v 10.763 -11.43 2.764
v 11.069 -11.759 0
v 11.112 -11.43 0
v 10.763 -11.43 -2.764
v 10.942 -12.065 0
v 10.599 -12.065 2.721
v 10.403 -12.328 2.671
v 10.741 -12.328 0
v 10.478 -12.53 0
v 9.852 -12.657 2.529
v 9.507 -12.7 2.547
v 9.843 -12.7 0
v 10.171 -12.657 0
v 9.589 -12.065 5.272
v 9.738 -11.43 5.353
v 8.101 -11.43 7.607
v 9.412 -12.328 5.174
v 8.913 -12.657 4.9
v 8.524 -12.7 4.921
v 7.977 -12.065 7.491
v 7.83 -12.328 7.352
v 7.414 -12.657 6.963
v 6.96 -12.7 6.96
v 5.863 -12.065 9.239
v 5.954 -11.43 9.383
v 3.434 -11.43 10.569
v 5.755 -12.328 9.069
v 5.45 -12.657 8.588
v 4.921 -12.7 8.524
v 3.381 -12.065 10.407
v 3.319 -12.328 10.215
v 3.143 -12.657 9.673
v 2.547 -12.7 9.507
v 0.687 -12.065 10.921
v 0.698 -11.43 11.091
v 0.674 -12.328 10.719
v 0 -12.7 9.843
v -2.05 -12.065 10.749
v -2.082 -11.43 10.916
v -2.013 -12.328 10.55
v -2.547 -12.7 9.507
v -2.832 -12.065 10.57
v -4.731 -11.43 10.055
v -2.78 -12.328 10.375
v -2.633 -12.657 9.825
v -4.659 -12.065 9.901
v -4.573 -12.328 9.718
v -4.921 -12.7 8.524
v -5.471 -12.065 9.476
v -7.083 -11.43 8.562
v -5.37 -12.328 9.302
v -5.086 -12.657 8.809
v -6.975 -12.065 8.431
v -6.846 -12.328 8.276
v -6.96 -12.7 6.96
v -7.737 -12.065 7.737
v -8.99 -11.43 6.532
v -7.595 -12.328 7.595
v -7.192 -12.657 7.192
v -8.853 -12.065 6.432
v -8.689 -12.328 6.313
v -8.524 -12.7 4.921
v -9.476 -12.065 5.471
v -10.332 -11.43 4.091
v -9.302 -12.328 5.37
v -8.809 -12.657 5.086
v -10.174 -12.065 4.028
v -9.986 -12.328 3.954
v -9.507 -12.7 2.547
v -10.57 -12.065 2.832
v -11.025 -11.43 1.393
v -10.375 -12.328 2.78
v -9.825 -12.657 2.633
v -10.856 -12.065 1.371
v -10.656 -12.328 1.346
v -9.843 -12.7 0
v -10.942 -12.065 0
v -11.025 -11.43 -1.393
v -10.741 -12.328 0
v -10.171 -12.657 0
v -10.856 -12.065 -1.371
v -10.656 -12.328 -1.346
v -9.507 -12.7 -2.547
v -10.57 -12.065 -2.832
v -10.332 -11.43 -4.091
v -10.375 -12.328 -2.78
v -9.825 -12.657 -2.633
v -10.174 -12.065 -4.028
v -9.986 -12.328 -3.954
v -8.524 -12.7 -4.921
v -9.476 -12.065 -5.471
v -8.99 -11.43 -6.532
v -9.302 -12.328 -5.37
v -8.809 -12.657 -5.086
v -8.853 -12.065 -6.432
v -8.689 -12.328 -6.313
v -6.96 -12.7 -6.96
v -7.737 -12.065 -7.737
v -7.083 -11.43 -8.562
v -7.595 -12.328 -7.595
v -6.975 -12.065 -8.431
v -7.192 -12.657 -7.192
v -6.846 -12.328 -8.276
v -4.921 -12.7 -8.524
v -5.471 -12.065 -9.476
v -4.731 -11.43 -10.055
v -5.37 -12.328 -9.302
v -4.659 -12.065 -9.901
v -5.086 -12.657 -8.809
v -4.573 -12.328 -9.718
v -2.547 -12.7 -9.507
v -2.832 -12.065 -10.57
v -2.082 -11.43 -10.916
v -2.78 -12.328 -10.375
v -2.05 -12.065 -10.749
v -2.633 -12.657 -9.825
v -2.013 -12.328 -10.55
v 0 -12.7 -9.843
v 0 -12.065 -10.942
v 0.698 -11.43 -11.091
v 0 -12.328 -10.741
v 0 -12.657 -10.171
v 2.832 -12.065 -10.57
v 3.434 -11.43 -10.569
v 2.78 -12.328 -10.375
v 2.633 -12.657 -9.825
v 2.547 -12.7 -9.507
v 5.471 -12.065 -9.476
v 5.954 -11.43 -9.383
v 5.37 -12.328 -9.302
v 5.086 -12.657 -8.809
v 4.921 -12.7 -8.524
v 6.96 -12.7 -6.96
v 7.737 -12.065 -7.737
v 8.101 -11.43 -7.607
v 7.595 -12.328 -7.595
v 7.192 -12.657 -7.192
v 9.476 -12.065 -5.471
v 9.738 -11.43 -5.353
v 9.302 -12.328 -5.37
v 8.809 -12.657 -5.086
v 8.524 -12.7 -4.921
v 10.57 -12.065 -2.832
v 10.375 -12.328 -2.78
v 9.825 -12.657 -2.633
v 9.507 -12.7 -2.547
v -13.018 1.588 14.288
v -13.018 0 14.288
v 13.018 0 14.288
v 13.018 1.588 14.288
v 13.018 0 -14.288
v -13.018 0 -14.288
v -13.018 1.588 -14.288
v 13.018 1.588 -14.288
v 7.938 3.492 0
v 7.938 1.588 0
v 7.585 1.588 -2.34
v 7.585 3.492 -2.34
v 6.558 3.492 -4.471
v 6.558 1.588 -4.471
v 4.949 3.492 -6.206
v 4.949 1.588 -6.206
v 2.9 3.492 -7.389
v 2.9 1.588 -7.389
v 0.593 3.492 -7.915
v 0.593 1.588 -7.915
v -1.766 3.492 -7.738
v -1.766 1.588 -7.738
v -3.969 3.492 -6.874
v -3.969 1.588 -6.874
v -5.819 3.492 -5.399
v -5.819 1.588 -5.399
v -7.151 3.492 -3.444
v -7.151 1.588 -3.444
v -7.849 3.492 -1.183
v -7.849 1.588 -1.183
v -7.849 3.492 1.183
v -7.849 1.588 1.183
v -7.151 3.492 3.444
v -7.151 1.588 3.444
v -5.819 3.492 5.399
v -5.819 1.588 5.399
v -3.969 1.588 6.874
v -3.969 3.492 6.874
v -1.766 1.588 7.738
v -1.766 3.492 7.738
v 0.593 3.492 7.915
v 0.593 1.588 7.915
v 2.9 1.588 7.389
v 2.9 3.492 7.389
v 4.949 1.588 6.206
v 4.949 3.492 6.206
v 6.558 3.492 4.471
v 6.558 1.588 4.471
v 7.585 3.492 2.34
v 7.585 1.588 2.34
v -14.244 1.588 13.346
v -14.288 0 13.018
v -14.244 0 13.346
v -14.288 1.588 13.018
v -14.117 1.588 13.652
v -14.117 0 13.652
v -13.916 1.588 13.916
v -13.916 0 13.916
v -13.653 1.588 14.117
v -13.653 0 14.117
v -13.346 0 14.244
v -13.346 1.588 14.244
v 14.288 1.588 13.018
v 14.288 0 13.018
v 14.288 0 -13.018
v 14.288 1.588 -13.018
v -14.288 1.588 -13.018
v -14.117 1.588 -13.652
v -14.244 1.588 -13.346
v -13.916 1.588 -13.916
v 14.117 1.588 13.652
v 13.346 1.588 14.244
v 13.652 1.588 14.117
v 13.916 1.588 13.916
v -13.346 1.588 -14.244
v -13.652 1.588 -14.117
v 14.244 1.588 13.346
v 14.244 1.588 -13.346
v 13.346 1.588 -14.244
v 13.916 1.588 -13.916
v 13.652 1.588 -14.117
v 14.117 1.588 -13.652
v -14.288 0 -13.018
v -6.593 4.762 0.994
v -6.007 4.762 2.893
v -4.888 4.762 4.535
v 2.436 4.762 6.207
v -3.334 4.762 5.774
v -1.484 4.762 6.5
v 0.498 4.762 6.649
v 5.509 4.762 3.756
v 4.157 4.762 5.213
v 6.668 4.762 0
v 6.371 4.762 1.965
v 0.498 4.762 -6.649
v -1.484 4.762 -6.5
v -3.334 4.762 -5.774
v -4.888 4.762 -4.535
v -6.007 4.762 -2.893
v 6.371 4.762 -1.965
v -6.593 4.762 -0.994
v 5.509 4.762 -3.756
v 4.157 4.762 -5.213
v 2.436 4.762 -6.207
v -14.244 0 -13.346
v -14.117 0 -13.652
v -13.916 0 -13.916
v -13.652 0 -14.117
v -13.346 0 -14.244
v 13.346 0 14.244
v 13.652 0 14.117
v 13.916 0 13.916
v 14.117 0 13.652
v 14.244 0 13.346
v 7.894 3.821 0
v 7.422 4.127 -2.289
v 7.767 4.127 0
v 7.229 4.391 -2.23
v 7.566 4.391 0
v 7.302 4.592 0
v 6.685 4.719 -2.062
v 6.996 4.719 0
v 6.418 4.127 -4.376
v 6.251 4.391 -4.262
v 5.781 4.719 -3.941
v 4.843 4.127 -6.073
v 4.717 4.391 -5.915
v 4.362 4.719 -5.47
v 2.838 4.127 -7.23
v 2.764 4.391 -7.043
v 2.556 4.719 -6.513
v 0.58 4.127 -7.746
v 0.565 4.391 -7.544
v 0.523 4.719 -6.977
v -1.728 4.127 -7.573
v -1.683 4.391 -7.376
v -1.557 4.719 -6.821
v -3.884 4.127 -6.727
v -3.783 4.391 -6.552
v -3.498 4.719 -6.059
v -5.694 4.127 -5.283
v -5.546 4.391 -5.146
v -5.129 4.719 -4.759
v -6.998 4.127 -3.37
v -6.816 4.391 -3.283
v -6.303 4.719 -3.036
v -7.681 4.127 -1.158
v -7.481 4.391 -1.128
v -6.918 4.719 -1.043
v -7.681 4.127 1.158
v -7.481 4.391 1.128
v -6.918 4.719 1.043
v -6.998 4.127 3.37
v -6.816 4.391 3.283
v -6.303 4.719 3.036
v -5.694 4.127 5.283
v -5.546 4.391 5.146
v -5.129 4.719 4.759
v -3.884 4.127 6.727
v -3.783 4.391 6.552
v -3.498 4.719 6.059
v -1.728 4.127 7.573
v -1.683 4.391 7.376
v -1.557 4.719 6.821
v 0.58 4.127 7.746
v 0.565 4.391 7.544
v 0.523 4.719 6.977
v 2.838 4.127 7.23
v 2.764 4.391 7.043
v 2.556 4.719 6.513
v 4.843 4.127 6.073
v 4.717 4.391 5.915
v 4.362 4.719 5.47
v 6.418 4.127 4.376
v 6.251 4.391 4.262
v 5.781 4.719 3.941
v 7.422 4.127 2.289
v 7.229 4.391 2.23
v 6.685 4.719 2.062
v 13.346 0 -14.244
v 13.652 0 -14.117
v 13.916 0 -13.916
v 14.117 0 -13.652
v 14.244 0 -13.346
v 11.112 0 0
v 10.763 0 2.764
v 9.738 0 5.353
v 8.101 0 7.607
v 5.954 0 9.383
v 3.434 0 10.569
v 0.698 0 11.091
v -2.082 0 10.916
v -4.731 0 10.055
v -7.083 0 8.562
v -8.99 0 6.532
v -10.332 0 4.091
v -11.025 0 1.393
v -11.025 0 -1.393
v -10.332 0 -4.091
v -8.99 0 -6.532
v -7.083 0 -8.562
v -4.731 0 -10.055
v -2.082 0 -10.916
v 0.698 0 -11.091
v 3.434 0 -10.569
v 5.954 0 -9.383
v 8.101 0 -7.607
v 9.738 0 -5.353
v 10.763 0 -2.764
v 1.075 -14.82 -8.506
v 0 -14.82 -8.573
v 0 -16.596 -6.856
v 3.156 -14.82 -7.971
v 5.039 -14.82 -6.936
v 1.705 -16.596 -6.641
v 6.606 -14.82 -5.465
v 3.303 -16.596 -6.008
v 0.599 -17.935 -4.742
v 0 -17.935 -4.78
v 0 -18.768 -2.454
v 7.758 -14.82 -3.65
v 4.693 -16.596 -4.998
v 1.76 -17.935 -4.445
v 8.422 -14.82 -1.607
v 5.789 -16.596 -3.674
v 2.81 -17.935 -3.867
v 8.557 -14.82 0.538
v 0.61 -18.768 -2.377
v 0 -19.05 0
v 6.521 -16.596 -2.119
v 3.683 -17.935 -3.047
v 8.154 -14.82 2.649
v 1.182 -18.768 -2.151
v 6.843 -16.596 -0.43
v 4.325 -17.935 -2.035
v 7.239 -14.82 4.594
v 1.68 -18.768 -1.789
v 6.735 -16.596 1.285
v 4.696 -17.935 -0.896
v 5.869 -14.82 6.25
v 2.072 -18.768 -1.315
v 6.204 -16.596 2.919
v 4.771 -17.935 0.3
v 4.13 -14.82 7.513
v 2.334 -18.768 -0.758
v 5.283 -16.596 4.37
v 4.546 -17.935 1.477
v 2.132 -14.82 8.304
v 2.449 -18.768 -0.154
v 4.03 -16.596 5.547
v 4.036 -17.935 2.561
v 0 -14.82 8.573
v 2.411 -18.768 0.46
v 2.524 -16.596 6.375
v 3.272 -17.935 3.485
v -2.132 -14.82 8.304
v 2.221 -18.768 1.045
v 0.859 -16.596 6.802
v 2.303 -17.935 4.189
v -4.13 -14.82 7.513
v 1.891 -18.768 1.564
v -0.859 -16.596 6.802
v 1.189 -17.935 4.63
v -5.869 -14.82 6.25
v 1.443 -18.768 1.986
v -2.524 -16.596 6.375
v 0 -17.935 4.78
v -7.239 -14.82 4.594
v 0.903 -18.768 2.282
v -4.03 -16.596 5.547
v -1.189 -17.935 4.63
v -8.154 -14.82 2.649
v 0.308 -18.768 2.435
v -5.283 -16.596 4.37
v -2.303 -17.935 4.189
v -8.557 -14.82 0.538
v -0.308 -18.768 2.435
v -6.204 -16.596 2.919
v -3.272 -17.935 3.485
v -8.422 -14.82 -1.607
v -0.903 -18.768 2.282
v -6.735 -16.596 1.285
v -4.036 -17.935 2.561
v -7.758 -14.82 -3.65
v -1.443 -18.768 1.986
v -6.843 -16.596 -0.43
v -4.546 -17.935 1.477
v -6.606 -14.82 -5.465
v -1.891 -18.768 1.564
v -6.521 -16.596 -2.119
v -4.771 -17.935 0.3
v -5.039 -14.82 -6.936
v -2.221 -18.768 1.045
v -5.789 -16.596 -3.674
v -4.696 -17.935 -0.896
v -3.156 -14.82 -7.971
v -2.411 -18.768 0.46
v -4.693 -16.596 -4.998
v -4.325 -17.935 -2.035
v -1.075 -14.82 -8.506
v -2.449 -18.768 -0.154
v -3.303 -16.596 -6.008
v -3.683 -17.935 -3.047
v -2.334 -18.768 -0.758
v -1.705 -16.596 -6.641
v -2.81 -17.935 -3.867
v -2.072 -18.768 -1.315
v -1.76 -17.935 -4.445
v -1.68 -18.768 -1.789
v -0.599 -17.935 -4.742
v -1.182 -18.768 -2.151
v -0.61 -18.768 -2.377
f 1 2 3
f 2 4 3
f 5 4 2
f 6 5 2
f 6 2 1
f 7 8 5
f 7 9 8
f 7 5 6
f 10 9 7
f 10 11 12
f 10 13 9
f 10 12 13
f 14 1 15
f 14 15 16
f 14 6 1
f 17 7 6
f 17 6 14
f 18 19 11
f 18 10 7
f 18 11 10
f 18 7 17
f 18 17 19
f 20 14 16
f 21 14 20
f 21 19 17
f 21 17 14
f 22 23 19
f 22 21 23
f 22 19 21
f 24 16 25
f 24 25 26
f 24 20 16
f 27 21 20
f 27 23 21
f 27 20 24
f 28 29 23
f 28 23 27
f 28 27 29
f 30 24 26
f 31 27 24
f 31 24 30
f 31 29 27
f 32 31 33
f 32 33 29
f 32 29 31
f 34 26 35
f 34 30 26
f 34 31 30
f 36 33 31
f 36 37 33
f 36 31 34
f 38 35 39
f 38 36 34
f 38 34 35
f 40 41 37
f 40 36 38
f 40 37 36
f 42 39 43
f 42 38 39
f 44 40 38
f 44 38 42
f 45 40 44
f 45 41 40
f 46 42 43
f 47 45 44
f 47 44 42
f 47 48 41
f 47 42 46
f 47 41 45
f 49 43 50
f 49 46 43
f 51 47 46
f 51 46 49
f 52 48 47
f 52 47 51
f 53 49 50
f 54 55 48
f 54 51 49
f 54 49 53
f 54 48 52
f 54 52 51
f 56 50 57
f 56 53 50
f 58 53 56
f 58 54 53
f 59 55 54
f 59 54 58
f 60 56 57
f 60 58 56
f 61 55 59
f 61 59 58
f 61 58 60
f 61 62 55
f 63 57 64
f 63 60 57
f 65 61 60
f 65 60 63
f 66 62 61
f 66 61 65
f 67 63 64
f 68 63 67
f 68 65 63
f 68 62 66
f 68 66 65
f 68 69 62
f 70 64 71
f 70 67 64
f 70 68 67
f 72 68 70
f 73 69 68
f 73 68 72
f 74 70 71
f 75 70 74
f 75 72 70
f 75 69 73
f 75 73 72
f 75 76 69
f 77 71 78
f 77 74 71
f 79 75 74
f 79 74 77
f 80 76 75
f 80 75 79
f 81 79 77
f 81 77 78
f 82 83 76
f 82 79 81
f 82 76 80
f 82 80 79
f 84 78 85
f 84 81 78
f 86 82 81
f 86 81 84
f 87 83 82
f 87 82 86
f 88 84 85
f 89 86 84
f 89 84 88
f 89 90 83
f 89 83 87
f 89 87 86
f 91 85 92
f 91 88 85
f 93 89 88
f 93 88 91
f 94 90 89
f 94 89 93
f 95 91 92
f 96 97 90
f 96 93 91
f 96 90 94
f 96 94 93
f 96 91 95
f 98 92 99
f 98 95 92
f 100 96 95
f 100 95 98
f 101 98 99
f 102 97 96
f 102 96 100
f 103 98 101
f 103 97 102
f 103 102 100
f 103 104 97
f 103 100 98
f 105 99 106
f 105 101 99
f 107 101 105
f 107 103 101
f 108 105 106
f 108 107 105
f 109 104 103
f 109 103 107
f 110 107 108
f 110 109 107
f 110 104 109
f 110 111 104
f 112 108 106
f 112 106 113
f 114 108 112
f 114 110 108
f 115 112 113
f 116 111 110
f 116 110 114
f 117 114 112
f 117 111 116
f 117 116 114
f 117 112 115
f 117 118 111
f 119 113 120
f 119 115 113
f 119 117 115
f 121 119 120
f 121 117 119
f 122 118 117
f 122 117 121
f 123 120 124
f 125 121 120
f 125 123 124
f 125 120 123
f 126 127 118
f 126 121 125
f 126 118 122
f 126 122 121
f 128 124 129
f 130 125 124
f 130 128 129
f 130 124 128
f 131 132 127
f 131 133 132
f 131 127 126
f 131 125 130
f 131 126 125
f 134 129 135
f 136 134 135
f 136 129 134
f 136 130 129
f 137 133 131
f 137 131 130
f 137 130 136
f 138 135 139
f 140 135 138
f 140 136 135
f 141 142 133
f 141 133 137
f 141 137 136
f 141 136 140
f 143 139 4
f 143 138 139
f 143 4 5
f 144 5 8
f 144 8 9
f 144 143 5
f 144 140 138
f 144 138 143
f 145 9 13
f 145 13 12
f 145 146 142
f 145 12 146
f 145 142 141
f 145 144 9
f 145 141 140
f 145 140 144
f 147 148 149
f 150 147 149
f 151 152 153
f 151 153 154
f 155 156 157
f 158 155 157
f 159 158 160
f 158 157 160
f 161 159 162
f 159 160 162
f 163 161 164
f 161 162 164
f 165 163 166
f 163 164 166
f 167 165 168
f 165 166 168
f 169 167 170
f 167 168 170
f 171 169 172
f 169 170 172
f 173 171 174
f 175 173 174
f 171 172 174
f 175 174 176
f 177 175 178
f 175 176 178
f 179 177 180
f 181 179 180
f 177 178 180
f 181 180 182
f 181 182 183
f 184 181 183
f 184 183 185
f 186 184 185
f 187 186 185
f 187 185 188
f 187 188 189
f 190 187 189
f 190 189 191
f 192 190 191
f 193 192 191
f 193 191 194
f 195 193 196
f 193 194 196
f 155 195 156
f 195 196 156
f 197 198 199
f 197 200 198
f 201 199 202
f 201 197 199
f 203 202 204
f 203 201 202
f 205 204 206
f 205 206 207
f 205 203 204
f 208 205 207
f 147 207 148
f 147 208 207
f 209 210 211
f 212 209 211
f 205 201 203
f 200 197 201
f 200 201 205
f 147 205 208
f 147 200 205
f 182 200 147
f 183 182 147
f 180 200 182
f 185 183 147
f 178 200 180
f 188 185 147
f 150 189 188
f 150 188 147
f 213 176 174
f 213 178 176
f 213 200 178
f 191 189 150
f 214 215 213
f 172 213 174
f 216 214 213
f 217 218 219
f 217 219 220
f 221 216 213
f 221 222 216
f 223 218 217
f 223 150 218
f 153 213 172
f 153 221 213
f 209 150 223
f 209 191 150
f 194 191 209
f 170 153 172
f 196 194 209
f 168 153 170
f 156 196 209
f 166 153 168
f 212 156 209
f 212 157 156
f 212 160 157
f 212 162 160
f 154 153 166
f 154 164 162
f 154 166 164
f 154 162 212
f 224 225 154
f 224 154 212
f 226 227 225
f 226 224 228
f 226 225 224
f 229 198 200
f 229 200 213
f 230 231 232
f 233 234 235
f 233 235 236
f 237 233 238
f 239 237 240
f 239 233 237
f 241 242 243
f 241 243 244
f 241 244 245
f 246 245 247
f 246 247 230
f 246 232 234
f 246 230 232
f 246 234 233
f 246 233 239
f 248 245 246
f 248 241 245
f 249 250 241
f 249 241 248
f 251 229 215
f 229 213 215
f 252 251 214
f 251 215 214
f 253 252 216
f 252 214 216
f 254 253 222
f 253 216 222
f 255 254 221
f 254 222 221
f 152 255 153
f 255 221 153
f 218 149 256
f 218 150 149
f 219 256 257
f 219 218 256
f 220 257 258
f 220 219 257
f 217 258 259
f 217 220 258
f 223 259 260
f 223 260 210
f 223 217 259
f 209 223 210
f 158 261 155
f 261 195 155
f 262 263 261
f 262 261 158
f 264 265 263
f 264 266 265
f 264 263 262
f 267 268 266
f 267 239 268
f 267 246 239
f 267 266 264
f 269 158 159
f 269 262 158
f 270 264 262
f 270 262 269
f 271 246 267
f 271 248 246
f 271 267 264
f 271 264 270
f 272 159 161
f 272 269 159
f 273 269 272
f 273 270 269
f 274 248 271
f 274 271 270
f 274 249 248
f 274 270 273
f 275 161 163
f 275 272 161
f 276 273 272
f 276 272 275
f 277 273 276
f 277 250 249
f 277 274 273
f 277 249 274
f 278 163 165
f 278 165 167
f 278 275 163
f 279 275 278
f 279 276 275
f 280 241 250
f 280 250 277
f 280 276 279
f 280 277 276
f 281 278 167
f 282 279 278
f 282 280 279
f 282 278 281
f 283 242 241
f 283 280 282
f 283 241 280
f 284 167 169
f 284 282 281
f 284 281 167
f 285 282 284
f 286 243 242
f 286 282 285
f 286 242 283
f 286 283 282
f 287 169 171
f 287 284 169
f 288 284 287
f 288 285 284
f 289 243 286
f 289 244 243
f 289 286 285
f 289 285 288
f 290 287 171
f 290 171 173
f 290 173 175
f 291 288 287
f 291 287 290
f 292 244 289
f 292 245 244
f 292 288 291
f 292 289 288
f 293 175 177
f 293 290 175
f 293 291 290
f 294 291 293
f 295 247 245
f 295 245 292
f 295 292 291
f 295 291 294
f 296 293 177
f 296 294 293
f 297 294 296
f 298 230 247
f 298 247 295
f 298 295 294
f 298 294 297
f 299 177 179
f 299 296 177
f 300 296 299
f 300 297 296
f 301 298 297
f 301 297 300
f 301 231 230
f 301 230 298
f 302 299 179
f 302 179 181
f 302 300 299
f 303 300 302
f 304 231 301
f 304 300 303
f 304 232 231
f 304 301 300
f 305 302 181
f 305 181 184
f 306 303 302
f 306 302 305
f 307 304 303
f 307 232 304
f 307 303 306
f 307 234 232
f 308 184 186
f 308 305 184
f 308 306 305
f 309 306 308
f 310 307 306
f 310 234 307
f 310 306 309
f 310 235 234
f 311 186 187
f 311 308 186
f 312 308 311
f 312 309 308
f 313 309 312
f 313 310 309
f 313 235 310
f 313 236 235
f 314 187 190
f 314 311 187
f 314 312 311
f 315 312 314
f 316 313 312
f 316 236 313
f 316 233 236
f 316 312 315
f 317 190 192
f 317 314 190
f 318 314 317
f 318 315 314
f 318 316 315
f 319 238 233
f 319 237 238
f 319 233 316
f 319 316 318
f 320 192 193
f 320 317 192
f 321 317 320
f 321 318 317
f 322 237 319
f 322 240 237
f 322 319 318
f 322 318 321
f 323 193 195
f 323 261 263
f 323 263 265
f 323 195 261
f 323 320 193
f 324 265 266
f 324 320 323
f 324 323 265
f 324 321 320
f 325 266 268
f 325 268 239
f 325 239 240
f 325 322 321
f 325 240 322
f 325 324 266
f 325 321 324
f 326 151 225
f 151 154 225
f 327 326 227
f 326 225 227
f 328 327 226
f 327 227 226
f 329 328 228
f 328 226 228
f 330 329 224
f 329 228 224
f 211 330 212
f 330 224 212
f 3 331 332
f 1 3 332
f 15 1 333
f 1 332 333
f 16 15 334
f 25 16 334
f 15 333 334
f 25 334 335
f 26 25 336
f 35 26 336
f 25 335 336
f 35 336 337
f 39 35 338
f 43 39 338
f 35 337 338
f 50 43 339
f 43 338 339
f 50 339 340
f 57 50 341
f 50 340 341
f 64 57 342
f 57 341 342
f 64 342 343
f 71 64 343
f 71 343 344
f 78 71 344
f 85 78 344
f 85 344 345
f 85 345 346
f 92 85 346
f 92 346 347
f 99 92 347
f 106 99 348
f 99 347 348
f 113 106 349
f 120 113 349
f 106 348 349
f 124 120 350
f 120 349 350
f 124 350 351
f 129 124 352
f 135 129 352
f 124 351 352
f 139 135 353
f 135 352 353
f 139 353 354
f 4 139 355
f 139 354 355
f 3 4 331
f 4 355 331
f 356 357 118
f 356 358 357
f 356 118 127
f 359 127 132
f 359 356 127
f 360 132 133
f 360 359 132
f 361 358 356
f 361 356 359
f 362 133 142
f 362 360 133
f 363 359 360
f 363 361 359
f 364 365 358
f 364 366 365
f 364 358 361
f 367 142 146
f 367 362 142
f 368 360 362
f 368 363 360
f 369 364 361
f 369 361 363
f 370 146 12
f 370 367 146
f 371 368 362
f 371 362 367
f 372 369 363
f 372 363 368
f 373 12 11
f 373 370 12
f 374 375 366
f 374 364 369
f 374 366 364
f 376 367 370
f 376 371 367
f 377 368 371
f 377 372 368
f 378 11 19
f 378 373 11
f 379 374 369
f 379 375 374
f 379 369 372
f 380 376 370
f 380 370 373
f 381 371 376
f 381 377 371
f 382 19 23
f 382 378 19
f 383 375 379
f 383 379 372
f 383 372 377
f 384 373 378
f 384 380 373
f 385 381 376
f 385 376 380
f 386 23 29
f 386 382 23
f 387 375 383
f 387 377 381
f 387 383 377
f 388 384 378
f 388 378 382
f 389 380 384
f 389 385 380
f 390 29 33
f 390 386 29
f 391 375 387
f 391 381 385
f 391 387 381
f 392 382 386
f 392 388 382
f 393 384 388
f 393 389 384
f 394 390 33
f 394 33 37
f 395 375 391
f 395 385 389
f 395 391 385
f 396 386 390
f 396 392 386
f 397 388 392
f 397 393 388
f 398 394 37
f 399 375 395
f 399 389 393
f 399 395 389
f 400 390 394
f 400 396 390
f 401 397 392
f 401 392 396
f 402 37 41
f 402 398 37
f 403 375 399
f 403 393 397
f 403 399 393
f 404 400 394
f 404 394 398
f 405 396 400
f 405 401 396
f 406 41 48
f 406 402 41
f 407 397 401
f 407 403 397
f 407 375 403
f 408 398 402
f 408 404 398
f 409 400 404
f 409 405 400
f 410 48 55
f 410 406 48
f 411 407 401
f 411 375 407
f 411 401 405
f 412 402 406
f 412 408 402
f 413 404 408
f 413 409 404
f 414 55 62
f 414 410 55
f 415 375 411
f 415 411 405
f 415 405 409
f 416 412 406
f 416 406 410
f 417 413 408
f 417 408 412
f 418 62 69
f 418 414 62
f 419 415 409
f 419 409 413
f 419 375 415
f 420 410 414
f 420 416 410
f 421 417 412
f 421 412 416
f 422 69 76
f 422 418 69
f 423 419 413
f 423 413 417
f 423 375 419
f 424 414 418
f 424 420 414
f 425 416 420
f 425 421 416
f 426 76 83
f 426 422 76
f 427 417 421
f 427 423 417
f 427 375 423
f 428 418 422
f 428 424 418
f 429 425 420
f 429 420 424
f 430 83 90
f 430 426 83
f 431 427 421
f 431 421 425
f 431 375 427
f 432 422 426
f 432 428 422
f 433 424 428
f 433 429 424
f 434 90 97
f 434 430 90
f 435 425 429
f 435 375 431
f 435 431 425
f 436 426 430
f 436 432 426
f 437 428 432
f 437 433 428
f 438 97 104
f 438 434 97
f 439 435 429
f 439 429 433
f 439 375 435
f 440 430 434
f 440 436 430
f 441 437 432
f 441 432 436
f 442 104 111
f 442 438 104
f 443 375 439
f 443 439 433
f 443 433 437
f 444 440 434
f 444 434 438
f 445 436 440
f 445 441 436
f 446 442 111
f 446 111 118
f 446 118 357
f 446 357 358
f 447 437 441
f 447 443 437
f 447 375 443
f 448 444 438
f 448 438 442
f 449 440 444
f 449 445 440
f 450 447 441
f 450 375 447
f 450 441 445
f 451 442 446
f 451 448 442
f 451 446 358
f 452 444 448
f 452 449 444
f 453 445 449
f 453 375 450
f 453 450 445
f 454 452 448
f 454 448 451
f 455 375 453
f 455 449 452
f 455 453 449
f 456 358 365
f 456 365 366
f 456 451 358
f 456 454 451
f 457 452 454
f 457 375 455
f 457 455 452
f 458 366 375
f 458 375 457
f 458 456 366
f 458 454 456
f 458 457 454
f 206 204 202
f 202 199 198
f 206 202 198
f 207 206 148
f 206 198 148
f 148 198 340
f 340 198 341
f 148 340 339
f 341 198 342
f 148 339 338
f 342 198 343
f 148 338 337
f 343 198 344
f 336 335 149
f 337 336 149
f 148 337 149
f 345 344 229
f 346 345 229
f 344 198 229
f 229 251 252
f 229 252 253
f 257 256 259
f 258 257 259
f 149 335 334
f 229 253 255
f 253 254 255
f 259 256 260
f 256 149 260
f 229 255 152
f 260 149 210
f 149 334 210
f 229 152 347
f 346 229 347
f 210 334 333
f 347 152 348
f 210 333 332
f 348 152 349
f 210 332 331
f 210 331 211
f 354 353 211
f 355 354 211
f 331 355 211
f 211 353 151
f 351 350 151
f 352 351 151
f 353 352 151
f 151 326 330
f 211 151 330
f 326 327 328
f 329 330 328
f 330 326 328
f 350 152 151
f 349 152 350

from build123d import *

# Parameters (mm, degrees)
SKETCH1_W           = 28.575
SKETCH1_H           = 28.575
BOSS_EXTRUDE1_DEPTH = 1.5875
SKETCH2_R           = 7.9375
BOSS_EXTRUDE2_DEPTH = 3.175
SKETCH3_R           = 11.1125
BOSS_EXTRUDE3_DEPTH = 12.7
FILLET1_R           = 1.27
DOME1_FACE_RADIUS   = 9.8425
DOME1_HEIGHT        = 6.35
FILLET2_R           = 1.27


with BuildPart() as part:
    # Sketch1 → Boss-Extrude1 (new body)
    with BuildSketch(Plane(origin=(0, 0, 0), x_dir=(1, 0, 0), z_dir=(0, 1, 0))):
        Rectangle(SKETCH1_W, SKETCH1_H)
    extrude(amount=BOSS_EXTRUDE1_DEPTH)

    # Sketch2 → Boss-Extrude2 (add)
    with BuildSketch(Plane(origin=(0, 1.5875, 0), x_dir=(1, 0, 0), z_dir=(0, 1, 0))):
        Circle(SKETCH2_R)
    extrude(amount=BOSS_EXTRUDE2_DEPTH)

    # Sketch3 → Boss-Extrude3 (add)
    with BuildSketch(Plane.XZ):
        Circle(SKETCH3_R)
    extrude(amount=BOSS_EXTRUDE3_DEPTH)

    # Fillet1
    fillet1_edges = [part.edges().sort_by_distance(p)[0] for p in [
        (-7.9375, 4.7625, 0),
        (-11.1125, -12.7, 0),
    ]]
    fillet(fillet1_edges, radius=FILLET1_R)

    # Dome1: a dome of height H over a round flat face of radius A is a cap of a sphere of radius (A * A + H * H) / (2 * H)
    dome1_r = (DOME1_FACE_RADIUS * DOME1_FACE_RADIUS + DOME1_HEIGHT * DOME1_HEIGHT) / (2 * DOME1_HEIGHT)
    dome1_base = Plane((0, -12.7, 0), z_dir=(0, -1, 0))
    with Locations(dome1_base.offset(DOME1_HEIGHT - dome1_r)):
        dome1_ball = Sphere(dome1_r, mode=Mode.PRIVATE)
    add(split(dome1_ball, bisect_by=dome1_base, keep=Keep.TOP, mode=Mode.PRIVATE))

    # Fillet2
    fillet2_edges = [part.edges().sort_by_distance(p)[0] for p in [
        (14.2875, 0.79375, 14.2875),
        (-14.2875, 0.79375, 14.2875),
        (-14.2875, 0.79375, -14.2875),
        (14.2875, 0.79375, -14.2875),
    ]]
    fillet(fillet2_edges, radius=FILLET2_R)


solid = part.part
